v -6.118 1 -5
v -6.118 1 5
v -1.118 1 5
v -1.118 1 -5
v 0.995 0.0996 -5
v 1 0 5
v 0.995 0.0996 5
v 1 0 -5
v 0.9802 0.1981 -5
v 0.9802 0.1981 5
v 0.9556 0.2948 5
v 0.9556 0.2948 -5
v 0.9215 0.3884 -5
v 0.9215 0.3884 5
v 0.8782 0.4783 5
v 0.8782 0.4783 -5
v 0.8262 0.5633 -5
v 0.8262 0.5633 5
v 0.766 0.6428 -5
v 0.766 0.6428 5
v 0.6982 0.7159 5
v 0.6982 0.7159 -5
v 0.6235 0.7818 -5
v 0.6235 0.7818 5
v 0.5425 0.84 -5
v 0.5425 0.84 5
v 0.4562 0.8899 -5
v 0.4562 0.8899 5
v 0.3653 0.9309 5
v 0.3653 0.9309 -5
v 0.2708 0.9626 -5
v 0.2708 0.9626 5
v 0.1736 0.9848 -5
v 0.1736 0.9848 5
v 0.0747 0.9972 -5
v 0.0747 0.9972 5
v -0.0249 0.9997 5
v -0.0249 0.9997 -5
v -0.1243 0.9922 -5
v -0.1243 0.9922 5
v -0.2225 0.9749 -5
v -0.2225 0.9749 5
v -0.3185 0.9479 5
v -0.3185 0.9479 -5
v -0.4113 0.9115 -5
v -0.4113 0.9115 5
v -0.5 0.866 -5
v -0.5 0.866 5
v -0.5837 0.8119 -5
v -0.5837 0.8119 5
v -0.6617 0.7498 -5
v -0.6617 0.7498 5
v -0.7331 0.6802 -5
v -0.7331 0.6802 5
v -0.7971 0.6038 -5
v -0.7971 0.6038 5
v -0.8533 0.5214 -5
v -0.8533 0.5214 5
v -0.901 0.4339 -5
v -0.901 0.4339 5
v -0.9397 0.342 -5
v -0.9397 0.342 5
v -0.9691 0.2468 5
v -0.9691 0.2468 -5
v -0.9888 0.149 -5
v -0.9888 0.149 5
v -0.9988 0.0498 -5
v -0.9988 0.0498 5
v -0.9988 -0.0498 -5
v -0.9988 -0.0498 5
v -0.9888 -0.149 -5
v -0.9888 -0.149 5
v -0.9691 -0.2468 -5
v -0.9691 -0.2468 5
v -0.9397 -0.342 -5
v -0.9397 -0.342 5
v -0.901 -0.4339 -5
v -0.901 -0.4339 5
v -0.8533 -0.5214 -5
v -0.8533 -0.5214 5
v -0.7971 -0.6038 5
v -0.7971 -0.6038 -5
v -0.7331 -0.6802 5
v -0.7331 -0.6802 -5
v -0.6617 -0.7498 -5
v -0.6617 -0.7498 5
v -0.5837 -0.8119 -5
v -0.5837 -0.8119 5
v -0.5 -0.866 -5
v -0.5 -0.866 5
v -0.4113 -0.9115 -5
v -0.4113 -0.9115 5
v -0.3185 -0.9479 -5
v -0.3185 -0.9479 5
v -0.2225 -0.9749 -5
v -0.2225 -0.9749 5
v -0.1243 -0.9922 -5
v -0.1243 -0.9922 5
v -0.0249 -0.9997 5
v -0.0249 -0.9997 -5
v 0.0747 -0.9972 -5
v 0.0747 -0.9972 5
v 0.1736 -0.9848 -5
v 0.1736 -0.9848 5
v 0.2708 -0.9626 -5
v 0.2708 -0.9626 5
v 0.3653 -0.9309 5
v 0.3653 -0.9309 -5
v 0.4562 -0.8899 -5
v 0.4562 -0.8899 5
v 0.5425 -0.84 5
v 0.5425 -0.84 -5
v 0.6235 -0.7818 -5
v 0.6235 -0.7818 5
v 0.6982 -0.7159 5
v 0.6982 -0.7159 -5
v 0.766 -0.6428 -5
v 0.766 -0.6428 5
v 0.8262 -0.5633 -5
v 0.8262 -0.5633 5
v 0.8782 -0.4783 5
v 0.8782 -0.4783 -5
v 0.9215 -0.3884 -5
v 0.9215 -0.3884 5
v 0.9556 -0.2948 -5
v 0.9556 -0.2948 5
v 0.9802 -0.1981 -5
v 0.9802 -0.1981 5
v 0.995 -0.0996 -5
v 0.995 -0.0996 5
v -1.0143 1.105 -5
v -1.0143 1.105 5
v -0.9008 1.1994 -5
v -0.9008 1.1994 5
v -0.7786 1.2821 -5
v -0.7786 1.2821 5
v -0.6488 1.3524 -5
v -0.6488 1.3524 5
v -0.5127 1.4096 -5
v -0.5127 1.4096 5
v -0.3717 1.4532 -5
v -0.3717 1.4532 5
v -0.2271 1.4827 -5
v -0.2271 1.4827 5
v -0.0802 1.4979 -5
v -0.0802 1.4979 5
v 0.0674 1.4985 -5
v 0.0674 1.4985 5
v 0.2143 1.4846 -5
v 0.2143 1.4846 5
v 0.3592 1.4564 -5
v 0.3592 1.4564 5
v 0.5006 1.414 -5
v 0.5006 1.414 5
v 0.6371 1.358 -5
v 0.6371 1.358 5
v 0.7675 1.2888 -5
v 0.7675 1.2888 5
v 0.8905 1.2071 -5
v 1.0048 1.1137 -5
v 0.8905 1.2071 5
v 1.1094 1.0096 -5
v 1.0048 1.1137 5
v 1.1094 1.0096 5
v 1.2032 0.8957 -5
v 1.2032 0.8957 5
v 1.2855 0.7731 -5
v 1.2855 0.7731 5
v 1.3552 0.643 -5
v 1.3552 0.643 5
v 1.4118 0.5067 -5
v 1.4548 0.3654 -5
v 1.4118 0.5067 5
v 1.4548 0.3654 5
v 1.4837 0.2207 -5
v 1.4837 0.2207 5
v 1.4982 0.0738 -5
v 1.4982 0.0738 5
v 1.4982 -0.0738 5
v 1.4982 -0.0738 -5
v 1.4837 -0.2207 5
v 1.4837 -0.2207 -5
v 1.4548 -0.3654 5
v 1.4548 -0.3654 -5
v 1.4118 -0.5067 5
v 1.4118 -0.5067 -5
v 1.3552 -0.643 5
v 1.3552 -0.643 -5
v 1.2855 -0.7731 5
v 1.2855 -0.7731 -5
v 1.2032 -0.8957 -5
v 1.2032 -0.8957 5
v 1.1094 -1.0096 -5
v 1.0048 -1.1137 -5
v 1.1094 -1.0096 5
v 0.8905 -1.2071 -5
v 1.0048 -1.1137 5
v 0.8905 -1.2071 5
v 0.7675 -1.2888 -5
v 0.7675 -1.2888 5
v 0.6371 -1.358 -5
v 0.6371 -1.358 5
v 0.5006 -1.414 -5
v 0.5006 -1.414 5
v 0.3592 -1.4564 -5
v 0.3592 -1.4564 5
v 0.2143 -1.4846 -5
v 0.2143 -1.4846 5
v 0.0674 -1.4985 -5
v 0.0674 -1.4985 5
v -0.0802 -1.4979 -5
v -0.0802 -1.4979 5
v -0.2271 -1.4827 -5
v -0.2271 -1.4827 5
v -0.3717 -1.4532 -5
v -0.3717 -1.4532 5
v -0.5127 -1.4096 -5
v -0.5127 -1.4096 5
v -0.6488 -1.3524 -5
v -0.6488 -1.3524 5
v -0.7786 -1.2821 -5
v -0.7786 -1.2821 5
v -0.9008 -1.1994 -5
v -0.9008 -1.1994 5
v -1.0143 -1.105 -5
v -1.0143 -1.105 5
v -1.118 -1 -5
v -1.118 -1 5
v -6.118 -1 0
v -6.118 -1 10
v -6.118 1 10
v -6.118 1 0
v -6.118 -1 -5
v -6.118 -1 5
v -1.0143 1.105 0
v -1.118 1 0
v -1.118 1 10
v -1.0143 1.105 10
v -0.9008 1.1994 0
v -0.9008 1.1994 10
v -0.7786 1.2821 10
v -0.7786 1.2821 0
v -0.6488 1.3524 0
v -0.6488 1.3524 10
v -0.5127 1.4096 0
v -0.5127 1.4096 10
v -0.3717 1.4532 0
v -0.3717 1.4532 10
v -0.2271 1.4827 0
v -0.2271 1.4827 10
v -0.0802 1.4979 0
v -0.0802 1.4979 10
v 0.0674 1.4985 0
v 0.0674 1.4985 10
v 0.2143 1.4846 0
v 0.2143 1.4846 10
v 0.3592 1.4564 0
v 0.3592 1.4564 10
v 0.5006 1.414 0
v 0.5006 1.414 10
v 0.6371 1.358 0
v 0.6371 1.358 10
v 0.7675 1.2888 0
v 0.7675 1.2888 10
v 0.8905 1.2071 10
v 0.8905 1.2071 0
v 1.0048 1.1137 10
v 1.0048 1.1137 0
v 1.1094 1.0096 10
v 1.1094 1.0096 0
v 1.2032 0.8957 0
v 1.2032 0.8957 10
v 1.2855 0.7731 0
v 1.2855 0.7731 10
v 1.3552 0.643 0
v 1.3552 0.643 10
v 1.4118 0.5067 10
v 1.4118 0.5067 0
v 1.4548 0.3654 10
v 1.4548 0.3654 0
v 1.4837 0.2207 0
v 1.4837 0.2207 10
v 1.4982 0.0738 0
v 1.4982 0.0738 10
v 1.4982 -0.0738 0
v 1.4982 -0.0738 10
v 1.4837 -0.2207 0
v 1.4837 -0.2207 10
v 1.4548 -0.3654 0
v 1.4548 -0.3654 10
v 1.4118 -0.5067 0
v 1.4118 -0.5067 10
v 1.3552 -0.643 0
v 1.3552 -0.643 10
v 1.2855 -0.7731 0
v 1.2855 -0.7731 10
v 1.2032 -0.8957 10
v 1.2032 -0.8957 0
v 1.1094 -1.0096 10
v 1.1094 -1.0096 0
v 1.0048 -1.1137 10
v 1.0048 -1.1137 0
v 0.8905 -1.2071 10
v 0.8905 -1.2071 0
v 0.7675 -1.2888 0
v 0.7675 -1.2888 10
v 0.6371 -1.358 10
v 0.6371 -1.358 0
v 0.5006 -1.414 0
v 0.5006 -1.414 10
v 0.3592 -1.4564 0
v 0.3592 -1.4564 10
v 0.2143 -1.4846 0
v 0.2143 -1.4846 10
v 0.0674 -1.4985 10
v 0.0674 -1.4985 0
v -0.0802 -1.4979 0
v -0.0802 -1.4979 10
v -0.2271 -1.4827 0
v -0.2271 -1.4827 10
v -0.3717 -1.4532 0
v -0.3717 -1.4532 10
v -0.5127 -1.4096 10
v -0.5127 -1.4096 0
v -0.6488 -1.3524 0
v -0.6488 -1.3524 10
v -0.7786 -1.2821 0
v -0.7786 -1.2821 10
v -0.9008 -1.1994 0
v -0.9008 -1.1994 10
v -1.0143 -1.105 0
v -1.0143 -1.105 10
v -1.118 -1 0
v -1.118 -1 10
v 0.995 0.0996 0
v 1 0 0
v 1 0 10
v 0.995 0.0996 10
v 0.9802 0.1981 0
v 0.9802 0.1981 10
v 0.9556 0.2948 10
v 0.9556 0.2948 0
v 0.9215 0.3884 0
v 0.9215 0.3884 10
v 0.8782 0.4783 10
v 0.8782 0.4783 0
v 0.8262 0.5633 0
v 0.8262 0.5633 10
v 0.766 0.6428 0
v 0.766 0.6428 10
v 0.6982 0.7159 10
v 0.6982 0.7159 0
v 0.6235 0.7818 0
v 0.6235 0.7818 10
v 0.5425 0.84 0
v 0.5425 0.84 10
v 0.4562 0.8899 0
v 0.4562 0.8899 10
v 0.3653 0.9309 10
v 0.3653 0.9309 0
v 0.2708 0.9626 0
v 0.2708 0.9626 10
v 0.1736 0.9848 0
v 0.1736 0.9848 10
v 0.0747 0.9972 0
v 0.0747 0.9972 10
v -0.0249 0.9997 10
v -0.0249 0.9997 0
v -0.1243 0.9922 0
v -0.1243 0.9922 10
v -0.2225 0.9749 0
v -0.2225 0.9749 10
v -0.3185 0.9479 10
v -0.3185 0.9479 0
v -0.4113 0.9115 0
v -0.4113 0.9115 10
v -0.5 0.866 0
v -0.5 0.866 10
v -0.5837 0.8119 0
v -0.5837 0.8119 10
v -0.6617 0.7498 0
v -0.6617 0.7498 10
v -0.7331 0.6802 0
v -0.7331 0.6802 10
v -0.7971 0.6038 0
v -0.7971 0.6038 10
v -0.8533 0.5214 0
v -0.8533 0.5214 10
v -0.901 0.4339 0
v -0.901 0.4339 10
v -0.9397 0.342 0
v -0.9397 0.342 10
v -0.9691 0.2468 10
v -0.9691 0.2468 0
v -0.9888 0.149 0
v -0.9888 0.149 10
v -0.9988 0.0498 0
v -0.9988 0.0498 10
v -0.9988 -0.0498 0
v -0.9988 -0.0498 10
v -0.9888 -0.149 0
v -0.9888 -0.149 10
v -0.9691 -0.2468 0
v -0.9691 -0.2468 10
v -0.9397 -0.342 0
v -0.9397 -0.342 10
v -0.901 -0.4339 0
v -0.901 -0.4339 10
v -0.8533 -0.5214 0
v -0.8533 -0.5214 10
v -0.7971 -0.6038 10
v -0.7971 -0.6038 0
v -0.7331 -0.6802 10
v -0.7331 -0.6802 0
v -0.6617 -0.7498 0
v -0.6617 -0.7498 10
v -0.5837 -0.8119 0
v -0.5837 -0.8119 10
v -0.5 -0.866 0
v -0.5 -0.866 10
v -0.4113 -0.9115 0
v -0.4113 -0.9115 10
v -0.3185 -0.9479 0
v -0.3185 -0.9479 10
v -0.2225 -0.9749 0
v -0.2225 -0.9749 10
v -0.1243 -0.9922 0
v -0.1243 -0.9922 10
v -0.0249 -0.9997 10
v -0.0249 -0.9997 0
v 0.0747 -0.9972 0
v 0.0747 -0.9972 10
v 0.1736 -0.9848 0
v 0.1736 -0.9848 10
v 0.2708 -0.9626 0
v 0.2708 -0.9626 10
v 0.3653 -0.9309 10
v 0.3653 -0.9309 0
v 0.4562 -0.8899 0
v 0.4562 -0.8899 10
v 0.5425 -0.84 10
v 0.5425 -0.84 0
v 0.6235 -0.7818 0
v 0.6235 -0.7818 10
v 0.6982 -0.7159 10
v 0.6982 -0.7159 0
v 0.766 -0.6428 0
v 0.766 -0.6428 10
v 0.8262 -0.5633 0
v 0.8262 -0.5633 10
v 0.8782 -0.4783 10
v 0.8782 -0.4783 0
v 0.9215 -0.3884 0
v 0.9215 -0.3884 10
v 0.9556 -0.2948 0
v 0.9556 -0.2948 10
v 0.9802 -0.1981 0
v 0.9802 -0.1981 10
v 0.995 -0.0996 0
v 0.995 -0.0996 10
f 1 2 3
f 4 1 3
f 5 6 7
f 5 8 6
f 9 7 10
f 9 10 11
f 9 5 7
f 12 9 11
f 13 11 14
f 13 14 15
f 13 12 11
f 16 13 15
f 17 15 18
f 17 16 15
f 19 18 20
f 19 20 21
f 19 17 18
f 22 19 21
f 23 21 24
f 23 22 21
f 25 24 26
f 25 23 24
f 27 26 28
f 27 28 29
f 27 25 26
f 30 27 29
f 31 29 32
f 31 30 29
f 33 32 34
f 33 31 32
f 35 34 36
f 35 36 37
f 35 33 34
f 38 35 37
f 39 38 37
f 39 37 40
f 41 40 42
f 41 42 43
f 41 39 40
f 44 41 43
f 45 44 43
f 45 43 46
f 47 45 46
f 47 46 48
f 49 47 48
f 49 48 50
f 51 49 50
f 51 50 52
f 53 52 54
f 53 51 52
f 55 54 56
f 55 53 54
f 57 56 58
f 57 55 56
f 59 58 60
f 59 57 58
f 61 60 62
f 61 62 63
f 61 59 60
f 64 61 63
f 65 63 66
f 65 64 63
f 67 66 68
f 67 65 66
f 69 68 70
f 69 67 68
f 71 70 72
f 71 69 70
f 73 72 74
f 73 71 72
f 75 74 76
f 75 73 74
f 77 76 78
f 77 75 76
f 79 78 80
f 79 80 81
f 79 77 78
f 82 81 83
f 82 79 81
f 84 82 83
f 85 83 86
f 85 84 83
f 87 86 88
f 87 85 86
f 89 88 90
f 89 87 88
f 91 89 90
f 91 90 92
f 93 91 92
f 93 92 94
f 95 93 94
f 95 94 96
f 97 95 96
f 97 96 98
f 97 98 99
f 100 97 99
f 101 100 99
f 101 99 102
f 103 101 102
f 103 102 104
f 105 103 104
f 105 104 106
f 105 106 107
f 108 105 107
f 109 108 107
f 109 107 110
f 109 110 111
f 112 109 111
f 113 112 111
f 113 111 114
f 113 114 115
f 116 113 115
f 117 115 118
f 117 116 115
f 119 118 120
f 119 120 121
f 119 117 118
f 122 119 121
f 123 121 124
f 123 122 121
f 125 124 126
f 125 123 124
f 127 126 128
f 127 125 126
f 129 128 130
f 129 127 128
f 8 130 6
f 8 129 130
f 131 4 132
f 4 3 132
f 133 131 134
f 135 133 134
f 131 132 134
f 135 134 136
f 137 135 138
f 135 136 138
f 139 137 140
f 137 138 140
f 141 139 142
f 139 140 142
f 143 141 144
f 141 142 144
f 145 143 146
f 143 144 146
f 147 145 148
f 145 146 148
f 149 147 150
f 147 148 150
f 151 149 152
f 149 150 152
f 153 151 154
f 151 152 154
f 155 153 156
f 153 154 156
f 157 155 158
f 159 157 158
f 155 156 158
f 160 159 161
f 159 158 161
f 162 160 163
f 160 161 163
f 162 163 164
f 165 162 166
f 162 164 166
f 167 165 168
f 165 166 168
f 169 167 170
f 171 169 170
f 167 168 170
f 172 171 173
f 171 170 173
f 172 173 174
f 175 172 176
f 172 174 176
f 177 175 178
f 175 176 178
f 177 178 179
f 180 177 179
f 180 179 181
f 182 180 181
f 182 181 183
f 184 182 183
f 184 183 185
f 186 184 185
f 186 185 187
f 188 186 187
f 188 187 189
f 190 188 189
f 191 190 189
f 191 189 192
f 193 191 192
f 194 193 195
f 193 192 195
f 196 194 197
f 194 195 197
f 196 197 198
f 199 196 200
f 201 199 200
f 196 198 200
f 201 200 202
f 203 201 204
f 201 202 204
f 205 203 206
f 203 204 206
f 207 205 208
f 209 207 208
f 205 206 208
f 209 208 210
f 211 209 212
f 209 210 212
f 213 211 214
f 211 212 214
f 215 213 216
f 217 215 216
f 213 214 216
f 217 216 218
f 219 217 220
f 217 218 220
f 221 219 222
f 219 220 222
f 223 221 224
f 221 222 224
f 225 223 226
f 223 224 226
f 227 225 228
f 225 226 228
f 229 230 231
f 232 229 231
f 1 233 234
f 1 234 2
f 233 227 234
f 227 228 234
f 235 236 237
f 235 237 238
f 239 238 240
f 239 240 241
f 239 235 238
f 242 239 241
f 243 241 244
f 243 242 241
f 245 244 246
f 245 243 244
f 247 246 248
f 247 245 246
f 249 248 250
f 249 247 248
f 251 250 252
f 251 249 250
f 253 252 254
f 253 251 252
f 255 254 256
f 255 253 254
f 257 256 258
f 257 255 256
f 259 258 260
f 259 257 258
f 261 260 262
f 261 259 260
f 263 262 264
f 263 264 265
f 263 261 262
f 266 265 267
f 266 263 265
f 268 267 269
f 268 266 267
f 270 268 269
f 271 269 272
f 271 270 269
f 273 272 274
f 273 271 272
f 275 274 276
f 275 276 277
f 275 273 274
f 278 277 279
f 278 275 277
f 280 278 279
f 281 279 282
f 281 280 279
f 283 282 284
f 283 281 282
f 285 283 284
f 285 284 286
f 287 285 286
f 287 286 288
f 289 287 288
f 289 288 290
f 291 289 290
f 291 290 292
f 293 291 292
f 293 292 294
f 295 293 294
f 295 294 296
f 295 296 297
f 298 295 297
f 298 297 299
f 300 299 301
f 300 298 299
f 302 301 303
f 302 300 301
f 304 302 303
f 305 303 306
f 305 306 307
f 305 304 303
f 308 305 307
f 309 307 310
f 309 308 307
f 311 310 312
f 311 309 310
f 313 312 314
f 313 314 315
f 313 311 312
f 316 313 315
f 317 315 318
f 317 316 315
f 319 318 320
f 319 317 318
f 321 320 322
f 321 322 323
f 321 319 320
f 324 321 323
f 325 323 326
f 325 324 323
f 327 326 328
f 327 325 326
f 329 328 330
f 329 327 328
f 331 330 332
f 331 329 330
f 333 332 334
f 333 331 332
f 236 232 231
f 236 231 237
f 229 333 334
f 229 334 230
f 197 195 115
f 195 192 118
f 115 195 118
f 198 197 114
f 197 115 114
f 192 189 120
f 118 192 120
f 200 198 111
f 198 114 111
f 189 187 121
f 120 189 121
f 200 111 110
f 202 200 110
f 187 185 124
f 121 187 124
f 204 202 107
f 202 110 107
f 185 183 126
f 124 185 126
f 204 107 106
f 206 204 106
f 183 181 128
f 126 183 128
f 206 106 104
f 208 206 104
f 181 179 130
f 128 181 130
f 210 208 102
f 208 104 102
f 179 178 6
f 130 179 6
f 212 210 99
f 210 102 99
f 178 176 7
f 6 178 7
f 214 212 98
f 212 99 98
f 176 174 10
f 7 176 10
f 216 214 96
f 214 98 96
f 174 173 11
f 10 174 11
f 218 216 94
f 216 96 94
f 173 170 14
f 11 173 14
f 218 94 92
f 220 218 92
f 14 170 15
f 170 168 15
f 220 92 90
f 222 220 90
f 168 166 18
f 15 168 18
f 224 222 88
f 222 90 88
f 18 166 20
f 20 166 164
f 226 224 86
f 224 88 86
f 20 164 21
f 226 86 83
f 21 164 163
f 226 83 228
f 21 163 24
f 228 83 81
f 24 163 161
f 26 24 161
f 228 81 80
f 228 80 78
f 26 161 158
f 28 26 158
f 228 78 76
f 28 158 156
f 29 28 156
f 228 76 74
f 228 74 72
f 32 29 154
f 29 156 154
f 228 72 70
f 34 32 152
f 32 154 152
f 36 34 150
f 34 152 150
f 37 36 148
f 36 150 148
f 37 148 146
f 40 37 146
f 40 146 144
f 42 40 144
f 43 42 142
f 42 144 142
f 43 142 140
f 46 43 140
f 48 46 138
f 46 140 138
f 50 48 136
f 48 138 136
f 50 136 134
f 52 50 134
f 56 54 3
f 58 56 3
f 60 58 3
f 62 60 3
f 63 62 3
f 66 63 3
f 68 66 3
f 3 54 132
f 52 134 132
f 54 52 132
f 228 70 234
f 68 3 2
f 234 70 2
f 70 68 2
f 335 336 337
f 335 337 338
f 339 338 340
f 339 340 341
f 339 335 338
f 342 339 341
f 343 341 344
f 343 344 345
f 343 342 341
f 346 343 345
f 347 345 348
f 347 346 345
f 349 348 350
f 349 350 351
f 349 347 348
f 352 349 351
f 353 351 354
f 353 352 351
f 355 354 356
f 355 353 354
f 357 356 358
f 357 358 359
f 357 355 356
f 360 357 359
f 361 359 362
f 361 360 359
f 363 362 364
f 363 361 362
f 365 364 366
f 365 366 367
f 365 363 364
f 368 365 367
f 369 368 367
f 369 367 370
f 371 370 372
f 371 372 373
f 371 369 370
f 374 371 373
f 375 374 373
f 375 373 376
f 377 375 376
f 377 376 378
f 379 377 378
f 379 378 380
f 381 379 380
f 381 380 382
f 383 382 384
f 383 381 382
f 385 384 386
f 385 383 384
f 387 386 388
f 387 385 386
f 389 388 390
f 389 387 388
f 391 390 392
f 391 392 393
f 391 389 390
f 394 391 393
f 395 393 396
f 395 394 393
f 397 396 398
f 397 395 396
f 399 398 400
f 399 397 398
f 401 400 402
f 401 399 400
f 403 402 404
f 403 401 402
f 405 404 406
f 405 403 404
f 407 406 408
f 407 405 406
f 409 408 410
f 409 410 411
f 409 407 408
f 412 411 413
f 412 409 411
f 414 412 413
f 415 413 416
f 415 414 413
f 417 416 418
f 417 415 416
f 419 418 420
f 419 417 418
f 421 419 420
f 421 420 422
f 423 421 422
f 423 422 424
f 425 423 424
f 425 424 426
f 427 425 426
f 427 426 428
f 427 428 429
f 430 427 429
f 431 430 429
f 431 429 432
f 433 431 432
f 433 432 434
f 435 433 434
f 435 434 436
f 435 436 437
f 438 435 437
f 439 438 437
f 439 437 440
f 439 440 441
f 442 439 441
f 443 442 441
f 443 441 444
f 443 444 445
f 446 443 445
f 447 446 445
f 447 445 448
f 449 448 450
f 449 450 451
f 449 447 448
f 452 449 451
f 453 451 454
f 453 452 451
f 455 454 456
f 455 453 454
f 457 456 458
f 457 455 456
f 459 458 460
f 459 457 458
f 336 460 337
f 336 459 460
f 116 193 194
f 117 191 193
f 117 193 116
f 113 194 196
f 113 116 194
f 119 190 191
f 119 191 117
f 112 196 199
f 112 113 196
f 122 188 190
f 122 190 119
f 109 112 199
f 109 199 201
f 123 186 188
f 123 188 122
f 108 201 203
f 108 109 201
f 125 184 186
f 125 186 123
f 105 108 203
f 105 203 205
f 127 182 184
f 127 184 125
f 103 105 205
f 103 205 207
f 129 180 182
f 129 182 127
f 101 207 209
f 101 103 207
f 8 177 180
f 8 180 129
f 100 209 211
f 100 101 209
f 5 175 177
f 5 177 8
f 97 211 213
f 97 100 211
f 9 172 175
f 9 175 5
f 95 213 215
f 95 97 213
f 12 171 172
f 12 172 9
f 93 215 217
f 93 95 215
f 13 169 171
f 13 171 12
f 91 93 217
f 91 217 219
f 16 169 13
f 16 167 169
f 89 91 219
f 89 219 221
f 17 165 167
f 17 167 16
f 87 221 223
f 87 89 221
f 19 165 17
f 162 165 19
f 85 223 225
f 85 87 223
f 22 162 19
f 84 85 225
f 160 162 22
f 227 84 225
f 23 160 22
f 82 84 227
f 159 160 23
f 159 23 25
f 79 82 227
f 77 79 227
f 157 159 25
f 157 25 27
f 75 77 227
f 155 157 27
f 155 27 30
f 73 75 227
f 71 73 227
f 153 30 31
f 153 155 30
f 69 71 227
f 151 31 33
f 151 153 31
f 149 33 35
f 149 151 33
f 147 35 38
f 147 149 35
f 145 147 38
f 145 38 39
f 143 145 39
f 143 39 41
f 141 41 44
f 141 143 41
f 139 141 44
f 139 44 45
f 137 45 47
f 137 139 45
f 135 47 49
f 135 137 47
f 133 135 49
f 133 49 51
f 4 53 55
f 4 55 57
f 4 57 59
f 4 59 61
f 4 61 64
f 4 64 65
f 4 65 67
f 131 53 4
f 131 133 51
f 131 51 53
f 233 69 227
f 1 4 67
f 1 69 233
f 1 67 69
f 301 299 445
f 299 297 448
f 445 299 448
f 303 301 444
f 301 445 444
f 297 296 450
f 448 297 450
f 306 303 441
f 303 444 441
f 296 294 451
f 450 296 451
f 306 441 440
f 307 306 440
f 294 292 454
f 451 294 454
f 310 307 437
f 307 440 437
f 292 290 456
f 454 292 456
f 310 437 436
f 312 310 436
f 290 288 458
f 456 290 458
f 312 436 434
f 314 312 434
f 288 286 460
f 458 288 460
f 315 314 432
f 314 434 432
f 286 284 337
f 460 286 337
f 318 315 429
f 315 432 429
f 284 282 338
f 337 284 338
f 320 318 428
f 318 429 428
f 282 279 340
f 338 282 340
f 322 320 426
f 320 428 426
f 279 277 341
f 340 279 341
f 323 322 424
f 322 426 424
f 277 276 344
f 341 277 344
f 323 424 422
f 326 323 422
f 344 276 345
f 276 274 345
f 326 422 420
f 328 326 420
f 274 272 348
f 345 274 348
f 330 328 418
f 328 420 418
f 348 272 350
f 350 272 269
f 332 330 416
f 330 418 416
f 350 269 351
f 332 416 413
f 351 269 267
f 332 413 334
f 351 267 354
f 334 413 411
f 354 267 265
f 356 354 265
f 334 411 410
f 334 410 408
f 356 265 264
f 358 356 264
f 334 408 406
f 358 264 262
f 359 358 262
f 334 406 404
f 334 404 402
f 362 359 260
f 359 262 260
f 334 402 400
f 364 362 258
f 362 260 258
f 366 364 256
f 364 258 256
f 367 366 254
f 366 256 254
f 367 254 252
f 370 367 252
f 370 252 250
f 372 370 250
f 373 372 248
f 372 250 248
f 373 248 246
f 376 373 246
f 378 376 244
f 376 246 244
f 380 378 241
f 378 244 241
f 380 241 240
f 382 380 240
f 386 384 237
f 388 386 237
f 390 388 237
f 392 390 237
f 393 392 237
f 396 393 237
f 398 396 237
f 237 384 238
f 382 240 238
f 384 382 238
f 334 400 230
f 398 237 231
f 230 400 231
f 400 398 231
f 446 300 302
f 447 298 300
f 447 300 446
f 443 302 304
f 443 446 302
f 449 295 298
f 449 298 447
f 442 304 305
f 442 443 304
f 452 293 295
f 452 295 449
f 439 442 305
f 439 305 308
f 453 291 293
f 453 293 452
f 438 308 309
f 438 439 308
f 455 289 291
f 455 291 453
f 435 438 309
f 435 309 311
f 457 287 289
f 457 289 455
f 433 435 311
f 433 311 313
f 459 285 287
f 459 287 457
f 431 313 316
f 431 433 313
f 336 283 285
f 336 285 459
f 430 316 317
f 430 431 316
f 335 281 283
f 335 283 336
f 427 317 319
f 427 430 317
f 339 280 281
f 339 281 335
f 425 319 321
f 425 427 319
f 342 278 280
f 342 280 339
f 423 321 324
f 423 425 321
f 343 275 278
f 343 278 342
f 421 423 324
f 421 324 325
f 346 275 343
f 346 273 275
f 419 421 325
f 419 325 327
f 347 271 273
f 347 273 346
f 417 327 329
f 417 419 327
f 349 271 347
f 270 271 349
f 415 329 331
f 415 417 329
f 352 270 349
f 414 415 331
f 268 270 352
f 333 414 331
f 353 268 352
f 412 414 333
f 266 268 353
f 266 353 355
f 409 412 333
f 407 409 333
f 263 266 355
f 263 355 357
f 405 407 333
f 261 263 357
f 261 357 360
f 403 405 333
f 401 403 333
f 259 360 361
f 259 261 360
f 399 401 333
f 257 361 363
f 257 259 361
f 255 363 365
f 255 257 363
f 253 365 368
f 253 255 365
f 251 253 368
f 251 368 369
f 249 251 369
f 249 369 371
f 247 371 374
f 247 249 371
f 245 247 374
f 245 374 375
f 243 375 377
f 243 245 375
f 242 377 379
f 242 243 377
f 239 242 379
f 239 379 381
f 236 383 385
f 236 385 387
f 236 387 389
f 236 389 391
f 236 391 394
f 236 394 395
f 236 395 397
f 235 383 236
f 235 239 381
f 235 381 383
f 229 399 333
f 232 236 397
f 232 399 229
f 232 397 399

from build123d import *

# Parameters (mm, degrees)
SKETCH_1_R      = 1
EXTRUDE_1_DEPTH = 10
SKETCH_1_2_R    = 1
EXTRUDE_3_DEPTH = 5


with BuildPart() as part:
    # 草图1 → 凸台-拉伸1 (new body)
    with BuildSketch(Plane.XY):
        with BuildLine():
            Line((-6.118033989, 1), (-1.118033989, 1))
            ThreePointArc((-1.118033989, 1), (1.5, 0), (-1.118033989, -1))
            Line((-1.118033989, -1), (-6.118033989, -1))
            Line((-6.118033989, -1), (-6.118033989, 1))
        make_face()
        Circle(SKETCH_1_R, mode=Mode.SUBTRACT)
    extrude(amount=EXTRUDE_1_DEPTH)


with BuildPart() as body_2:
    # 草图1<2> → 凸台-拉伸3 (new, symmetric)
    with BuildSketch(Plane.XY):
        with BuildLine():
            Line((-6.118033989, 1), (-1.118033989, 1))
            ThreePointArc((-1.118033989, 1), (1.5, 0), (-1.118033989, -1))
            Line((-1.118033989, -1), (-6.118033989, -1))
            Line((-6.118033989, -1), (-6.118033989, 1))
        make_face()
        Circle(SKETCH_1_2_R, mode=Mode.SUBTRACT)
    extrude(amount=EXTRUDE_3_DEPTH, both=True)


solid = Compound([part.part, body_2.part])
